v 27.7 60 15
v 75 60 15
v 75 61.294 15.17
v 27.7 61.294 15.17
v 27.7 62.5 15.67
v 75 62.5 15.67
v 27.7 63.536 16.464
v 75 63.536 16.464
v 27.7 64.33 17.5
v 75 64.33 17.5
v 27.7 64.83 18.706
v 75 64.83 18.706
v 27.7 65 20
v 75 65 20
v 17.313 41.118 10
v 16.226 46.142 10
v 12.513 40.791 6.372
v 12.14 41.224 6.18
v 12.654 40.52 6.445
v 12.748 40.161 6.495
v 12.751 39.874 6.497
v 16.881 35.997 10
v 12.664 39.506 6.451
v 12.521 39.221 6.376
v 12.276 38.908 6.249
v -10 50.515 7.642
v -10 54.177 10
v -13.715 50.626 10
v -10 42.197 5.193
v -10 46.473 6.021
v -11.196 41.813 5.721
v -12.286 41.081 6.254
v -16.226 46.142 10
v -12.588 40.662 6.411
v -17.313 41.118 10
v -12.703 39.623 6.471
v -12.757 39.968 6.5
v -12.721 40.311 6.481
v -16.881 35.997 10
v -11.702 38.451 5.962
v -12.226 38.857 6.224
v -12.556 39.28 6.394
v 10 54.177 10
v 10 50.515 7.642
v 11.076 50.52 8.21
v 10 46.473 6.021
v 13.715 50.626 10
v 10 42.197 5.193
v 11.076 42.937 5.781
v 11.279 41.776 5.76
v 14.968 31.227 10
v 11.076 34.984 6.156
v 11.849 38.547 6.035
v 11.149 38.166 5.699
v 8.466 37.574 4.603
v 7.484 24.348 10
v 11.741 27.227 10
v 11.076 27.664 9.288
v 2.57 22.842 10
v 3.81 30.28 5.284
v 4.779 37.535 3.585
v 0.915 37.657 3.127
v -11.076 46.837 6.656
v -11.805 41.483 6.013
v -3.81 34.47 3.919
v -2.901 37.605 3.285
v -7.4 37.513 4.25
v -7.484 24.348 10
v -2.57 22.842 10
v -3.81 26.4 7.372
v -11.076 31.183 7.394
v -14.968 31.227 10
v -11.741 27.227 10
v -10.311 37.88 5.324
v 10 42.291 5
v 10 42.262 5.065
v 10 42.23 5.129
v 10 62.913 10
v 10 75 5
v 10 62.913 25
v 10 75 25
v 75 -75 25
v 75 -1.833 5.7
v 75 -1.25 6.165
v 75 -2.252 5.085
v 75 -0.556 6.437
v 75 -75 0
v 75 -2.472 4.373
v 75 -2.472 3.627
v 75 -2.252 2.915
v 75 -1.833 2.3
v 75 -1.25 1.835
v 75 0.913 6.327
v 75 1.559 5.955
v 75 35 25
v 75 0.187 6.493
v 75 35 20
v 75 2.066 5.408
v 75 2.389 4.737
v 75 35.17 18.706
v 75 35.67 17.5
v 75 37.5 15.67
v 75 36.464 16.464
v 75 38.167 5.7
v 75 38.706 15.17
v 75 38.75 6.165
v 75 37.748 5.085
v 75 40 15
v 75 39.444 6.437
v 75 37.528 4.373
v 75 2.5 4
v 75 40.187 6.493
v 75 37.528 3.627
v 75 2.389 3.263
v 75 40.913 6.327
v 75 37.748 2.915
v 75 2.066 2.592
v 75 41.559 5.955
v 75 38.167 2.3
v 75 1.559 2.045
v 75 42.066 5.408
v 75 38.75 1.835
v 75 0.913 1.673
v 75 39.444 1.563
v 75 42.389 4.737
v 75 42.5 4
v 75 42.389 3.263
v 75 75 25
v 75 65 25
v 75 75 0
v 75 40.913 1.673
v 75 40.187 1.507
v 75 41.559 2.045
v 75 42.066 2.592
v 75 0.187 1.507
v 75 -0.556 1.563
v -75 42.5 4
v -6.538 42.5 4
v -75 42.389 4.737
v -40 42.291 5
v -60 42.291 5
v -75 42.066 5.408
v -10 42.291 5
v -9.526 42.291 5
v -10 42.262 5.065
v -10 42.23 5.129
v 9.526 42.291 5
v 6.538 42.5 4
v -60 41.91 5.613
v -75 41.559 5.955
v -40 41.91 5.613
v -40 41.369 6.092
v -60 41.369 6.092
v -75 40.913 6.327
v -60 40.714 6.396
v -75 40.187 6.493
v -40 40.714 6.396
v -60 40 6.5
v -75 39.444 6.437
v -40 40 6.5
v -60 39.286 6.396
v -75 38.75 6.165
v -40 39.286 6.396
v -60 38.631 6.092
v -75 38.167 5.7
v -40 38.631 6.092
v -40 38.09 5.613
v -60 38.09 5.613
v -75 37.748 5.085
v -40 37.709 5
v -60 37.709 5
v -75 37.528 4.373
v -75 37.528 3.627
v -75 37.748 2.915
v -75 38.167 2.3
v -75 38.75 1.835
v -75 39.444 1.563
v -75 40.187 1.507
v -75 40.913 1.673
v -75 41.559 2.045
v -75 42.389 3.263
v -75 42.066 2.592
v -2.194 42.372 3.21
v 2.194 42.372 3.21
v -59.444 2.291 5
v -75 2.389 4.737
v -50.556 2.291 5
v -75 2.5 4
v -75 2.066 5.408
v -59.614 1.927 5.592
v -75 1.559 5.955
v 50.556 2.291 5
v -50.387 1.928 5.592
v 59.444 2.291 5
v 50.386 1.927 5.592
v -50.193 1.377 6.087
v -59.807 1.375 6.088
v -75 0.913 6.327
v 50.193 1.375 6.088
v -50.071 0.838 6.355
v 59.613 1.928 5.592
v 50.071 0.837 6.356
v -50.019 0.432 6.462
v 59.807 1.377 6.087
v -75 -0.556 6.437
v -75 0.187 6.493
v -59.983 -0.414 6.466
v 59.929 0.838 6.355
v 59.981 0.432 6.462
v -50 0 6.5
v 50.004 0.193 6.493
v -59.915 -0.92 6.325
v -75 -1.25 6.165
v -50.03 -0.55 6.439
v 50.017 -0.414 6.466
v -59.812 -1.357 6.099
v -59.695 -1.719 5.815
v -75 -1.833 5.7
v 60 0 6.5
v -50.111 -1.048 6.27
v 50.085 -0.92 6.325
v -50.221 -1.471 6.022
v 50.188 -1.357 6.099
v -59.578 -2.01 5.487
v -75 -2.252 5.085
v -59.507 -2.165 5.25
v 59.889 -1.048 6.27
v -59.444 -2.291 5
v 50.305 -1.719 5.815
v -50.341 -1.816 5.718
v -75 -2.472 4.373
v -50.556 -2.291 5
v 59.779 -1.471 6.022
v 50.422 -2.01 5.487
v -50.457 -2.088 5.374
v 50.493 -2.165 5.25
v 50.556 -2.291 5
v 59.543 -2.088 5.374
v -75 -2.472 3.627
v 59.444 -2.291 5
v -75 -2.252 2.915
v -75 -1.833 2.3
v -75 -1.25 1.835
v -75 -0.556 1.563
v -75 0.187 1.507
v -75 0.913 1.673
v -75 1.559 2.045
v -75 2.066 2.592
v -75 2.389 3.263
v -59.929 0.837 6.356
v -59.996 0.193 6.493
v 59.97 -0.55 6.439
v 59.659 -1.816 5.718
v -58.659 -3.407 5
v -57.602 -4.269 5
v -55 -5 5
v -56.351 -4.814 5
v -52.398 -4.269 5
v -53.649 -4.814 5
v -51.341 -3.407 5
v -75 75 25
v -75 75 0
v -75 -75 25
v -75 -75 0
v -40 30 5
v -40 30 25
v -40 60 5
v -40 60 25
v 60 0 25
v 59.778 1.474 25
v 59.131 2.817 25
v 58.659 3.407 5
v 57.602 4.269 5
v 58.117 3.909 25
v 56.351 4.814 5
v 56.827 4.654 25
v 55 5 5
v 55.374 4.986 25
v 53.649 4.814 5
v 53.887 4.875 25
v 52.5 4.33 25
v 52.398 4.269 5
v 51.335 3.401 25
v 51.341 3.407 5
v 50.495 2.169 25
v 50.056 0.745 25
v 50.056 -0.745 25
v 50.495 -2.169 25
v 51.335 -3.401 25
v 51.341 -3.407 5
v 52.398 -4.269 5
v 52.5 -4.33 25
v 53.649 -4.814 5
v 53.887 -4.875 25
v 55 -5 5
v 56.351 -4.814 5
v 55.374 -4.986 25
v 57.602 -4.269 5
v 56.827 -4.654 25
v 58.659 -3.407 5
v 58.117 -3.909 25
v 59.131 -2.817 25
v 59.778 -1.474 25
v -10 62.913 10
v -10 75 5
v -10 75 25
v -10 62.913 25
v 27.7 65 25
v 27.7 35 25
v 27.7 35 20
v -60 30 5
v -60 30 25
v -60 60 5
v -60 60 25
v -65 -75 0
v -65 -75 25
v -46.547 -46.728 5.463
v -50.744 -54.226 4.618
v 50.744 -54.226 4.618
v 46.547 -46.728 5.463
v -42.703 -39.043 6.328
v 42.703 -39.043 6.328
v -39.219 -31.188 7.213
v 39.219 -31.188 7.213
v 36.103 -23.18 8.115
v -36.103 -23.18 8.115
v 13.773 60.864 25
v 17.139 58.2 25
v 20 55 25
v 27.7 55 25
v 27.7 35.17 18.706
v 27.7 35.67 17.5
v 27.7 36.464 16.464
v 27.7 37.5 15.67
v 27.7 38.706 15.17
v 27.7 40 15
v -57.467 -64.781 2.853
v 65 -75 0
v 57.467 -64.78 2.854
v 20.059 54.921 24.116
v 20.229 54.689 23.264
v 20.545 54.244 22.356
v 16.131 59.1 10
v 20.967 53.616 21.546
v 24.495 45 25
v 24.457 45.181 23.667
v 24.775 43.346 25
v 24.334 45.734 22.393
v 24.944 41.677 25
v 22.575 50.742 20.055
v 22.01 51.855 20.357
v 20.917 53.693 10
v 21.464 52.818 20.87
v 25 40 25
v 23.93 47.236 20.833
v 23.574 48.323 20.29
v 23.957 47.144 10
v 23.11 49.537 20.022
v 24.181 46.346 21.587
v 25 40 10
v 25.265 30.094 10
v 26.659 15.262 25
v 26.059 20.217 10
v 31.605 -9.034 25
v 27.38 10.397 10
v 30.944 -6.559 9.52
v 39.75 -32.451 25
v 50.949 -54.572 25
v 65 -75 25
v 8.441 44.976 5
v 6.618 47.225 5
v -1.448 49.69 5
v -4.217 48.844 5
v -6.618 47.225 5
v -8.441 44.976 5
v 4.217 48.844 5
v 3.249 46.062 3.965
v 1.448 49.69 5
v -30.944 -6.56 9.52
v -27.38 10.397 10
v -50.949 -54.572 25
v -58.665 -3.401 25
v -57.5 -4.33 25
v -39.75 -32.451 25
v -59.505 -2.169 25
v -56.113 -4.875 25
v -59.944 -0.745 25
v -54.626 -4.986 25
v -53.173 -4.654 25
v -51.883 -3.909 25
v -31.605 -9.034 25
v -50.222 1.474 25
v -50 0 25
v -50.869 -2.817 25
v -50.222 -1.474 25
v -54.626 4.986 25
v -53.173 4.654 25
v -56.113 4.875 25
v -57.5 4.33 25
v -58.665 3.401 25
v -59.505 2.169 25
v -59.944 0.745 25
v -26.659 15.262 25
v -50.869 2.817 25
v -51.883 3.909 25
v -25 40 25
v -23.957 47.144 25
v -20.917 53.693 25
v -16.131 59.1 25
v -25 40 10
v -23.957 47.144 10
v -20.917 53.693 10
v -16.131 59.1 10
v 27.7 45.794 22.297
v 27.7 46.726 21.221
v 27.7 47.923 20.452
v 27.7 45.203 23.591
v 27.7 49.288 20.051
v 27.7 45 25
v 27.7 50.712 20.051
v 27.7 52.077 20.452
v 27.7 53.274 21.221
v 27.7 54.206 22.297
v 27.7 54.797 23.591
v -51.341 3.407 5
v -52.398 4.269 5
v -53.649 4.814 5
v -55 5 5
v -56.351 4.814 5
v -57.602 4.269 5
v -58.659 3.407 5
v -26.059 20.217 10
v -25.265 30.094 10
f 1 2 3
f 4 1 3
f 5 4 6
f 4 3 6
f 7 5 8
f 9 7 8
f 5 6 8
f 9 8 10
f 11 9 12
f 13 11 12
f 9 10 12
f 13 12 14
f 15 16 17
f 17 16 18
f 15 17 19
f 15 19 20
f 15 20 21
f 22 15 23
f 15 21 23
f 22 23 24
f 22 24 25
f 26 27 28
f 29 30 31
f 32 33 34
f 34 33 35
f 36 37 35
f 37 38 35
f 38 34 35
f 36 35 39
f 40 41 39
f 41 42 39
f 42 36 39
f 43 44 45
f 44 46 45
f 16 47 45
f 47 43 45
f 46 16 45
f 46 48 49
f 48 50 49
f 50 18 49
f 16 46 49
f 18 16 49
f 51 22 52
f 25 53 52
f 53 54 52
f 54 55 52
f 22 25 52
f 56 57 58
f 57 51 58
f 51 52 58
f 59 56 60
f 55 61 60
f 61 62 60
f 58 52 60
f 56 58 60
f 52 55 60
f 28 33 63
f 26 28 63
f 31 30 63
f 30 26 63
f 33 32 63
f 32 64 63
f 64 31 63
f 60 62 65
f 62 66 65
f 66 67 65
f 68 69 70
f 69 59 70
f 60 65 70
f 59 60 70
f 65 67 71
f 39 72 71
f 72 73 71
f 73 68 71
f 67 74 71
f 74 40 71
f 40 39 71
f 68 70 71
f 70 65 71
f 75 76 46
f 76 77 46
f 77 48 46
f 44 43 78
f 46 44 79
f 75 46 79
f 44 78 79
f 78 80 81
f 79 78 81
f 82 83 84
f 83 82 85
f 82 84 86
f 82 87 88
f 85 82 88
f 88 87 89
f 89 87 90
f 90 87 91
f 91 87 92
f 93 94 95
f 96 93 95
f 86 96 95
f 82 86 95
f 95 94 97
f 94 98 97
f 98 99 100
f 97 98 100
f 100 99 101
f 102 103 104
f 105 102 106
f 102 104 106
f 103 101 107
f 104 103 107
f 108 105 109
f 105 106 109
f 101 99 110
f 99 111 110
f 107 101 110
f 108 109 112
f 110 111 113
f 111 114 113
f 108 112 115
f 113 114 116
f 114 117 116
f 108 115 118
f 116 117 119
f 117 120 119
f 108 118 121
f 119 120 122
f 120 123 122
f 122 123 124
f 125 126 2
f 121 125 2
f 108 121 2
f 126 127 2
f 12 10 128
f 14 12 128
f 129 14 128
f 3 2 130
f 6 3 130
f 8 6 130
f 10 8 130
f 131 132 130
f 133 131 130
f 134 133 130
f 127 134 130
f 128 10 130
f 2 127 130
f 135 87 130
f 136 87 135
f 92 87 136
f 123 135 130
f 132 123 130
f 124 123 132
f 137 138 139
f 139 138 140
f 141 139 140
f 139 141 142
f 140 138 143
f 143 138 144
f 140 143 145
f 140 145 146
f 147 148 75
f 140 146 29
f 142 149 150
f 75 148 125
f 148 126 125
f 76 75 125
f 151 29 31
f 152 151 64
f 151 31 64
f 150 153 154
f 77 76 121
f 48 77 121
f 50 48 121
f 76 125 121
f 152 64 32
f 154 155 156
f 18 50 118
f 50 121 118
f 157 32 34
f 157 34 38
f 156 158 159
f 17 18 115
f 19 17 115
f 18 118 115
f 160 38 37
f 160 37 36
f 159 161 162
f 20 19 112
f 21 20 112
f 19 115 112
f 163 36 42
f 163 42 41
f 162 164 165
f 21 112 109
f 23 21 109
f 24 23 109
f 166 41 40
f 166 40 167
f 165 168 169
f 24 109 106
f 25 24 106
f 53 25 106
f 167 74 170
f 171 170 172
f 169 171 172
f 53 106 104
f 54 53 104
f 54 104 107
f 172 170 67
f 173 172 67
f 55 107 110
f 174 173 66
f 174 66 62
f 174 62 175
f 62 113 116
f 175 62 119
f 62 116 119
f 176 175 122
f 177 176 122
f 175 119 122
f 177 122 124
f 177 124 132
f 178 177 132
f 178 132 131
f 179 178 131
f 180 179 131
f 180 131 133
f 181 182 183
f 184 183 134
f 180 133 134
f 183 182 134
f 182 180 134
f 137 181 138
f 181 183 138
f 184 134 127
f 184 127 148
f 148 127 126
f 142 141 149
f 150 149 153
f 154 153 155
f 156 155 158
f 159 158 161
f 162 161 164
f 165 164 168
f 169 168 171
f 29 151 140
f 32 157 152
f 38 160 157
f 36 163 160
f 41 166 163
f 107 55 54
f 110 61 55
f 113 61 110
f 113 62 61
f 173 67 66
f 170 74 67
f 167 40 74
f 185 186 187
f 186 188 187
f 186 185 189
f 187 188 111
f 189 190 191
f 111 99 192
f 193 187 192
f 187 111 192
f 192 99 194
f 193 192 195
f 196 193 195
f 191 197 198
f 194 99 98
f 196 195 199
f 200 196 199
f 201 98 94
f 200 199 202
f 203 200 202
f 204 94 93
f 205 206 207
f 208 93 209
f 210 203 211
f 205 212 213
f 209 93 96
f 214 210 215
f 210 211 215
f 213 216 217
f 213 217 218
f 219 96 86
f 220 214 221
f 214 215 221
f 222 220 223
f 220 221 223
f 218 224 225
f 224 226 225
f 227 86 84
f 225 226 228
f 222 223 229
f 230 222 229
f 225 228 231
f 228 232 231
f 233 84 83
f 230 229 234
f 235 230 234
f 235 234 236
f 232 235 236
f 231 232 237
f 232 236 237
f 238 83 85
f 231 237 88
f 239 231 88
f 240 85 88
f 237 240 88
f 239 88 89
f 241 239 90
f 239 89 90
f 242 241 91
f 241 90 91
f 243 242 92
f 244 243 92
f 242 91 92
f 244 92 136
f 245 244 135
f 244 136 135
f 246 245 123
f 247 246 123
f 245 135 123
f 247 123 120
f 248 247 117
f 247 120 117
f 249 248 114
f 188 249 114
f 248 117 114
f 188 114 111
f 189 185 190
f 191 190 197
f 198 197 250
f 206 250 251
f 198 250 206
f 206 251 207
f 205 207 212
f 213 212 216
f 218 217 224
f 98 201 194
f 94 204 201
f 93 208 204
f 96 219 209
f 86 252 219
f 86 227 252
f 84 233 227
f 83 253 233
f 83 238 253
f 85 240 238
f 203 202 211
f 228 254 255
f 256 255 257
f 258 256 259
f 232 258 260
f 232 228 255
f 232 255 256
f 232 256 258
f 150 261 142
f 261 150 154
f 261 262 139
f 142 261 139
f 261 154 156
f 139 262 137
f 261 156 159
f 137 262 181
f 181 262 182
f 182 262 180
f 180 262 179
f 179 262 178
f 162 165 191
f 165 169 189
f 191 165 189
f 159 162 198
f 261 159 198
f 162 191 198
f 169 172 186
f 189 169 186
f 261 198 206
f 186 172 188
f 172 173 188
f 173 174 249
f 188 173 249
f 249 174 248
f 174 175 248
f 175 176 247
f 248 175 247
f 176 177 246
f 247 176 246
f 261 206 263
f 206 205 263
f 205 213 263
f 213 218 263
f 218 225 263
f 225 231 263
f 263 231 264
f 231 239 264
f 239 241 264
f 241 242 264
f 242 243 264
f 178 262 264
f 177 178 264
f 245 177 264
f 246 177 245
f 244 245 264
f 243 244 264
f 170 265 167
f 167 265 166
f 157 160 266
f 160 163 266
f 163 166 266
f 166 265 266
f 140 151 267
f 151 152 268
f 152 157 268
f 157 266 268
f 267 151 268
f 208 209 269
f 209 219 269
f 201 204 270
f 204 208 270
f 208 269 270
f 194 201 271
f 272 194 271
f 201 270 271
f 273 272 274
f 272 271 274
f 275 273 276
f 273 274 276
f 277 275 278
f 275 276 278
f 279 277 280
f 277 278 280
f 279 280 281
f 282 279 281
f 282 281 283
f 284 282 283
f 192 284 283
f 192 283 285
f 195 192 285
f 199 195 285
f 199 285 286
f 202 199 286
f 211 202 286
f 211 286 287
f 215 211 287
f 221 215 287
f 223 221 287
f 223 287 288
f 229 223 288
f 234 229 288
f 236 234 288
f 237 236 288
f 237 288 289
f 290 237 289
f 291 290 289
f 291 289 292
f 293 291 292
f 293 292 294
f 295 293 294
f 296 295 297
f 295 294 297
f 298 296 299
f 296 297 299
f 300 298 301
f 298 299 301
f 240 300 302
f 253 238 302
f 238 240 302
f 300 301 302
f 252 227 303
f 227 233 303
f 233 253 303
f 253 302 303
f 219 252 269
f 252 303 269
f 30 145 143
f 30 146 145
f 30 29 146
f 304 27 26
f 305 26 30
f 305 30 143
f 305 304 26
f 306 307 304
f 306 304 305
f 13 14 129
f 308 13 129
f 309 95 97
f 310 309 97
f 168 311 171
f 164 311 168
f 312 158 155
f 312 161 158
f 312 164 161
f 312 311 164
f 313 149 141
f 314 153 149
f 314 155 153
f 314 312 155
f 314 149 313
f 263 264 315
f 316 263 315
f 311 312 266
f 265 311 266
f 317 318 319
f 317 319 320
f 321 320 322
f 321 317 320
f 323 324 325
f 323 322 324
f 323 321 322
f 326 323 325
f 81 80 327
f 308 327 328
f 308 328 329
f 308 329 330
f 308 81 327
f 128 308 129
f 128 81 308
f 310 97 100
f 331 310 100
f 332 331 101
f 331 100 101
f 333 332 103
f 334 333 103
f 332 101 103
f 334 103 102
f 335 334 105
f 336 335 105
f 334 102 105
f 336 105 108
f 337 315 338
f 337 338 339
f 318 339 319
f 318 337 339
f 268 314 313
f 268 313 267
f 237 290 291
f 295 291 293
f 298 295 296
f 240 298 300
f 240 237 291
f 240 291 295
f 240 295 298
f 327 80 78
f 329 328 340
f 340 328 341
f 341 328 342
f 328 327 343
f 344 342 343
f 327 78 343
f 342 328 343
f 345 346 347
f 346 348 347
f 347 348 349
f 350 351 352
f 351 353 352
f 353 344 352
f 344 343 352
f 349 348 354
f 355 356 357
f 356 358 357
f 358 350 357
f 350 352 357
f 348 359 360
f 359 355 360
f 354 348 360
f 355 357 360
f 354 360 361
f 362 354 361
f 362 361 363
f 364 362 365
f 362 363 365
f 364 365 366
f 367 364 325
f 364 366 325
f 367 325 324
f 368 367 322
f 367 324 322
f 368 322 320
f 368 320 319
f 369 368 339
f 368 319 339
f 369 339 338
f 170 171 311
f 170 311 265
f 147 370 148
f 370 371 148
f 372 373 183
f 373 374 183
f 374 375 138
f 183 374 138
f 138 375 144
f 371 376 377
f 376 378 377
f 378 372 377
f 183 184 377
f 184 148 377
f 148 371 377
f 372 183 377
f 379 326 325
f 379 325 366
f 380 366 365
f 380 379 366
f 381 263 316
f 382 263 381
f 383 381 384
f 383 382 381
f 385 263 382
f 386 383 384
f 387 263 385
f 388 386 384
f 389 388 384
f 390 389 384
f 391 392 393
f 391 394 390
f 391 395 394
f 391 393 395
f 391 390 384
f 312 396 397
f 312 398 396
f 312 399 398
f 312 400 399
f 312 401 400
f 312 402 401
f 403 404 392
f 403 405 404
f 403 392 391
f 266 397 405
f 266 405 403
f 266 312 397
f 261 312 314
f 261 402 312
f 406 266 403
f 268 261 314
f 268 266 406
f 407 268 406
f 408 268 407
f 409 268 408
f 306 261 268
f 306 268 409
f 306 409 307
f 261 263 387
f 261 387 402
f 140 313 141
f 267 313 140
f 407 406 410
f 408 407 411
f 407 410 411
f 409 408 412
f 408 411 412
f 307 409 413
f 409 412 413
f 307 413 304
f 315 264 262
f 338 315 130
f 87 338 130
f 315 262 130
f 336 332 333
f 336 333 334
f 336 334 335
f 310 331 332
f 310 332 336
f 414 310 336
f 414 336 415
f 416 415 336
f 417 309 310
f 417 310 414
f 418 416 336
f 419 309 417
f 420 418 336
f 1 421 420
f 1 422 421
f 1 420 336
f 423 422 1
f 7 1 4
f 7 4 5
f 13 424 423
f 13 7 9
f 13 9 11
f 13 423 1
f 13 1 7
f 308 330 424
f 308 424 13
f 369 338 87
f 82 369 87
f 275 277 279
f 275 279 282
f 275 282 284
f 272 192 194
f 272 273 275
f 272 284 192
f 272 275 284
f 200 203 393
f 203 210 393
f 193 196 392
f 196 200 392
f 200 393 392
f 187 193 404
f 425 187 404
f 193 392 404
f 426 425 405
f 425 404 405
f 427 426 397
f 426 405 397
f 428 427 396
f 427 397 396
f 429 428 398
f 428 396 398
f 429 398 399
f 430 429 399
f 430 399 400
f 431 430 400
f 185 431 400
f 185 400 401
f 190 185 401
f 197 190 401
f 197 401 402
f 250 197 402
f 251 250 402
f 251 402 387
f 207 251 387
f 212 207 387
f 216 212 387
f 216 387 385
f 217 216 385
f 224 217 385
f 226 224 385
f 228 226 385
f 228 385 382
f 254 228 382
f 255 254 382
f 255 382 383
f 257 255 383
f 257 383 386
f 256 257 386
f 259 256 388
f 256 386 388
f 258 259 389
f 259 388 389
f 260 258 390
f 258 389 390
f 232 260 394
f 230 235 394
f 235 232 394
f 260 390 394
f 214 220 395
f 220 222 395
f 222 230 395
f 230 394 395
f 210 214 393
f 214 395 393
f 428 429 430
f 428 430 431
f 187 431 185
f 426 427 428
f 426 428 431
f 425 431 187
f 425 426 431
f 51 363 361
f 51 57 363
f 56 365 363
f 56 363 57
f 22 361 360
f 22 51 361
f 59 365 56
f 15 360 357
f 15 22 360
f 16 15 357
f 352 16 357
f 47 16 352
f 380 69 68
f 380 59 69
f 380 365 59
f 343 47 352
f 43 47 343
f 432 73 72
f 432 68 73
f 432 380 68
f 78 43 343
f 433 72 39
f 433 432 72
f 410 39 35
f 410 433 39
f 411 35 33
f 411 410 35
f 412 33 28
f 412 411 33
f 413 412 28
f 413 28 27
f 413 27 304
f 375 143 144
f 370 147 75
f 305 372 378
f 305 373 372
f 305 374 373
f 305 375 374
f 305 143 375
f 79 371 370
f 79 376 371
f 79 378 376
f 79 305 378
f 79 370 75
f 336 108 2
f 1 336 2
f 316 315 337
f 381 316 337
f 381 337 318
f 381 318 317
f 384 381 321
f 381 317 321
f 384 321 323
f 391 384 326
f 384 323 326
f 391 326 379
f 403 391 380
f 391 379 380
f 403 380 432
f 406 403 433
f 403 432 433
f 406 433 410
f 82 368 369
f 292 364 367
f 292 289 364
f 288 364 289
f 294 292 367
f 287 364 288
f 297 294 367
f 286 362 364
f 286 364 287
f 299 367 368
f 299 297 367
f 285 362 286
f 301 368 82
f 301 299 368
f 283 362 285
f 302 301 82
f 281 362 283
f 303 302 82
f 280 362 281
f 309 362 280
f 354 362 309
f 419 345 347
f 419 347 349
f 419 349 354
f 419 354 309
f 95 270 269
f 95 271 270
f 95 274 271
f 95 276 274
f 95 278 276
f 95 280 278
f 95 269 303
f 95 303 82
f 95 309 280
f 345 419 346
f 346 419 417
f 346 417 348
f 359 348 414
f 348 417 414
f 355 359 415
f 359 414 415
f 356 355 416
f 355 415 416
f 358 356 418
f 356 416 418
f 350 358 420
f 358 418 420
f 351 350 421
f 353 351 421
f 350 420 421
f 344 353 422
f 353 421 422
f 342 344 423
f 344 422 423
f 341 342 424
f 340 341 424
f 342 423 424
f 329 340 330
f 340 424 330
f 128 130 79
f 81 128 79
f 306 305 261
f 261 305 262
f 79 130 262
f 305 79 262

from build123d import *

# Parameters (mm, degrees)
F1_DEPTH  = 25
F3_DEPTH  = 150
F7_R      = 2.5
F8_DEPTH  = 150.001
F9_W      = 20
F9_H      = 30
F9_R      = 5
F9_H_2    = 35
F10_DEPTH = 20
F12_DEPTH = 47.3
F13_R     = 5
F14_DEPTH = 15.8


with BuildPart() as f1:
    # F0 (on Top) → F1 (new body)
    with BuildSketch(Plane.XY):
        with BuildLine():
            Line((75, 75), (-75, 75))
            Line((-75, 75), (-75, -75))
            Line((-75, -75), (-65, -75))
            ThreePointArc((-65, -75), (-35.2854373604, -20.8789783094), (-25, 40))
            ThreePointArc((-25, 40), (0, 65), (25, 40))
            ThreePointArc((25, 40), (35.2854373604, -20.8789783094), (65, -75))
            Line((65, -75), (75, -75))
            Line((75, -75), (75, 75))
        make_face()
    extrude(amount=F1_DEPTH)

    # F2 (on face) → F3 (join, through all)
    with BuildSketch(Plane(origin=(-75, 0, 0), x_dir=(0, -1, 0), z_dir=(-1, 0, 0))):
        with BuildLine():
            Line((-75, 10), (-75, 0))
            Line((-75, 0), (75, 0))
            ThreePointArc((75, 0), (64.7364457874, 2.863347323), (54.2264872704, 4.6183615505))
            Line((54.2264872704, 4.6183615505), (23.1799102031, 8.115113068))
            ThreePointArc((23.1799102031, 8.115113068), (6.4181072647, 9.5284076014), (-10.3965601359, 10))
            Line((-10.3965601359, 10), (-75, 10))
        make_face()
    extrude(amount=-F3_DEPTH)

    # F5 (on offset) → F6 (revolve, cut)
    with BuildSketch(Plane.XY.offset(28)):
        with BuildLine():
            Line((-25, 40), (25, 40))
            ThreePointArc((25, 40), (0, 65), (-25, 40))
        make_face()
    revolve(axis=Axis((0, 40, 28), (-1, 0, 0)), mode=Mode.SUBTRACT)

    # F7 (on face) → F8 (cut, through all)
    with BuildSketch(Plane.YZ.offset(75)):
        with Locations((40, 4)):
            Circle(F7_R)
        with Locations((0, 4)):
            Circle(F7_R)
    extrude(amount=-F8_DEPTH, mode=Mode.SUBTRACT)

    # F9 (on face) → F10 (cut)
    with BuildSketch(Plane.XY.offset(25)):
        with Locations((-50, 45)):
            Rectangle(F9_W, F9_H)
        with Locations((-55, 0)):
            Circle(F9_R)
        with Locations((55, 0)):
            Circle(F9_R)
        with Locations((0, 57.5)):
            Rectangle(F9_W, F9_H_2)
    extrude(amount=-F10_DEPTH, mode=Mode.SUBTRACT)

    # F11 (on face) → F12 (cut)
    with BuildSketch(Plane.YZ.offset(75)):
        with BuildLine():
            Line((65, 25), (35, 25))
            Line((35, 25), (35, 20))
            ThreePointArc((35, 20), (36.4644660941, 16.4644660941), (40, 15))
            Line((40, 15), (60, 15))
            ThreePointArc((60, 15), (63.5355339059, 16.4644660941), (65, 20))
            Line((65, 20), (65, 25))
        make_face()
    extrude(amount=-F12_DEPTH, mode=Mode.SUBTRACT)

    # F13 (on face) → F14 (cut)
    with BuildSketch(Plane.YZ.offset(27.7)):
        with Locations((50, 25)):
            Circle(F13_R)
    extrude(amount=-F14_DEPTH, mode=Mode.SUBTRACT)


solid = f1.part
